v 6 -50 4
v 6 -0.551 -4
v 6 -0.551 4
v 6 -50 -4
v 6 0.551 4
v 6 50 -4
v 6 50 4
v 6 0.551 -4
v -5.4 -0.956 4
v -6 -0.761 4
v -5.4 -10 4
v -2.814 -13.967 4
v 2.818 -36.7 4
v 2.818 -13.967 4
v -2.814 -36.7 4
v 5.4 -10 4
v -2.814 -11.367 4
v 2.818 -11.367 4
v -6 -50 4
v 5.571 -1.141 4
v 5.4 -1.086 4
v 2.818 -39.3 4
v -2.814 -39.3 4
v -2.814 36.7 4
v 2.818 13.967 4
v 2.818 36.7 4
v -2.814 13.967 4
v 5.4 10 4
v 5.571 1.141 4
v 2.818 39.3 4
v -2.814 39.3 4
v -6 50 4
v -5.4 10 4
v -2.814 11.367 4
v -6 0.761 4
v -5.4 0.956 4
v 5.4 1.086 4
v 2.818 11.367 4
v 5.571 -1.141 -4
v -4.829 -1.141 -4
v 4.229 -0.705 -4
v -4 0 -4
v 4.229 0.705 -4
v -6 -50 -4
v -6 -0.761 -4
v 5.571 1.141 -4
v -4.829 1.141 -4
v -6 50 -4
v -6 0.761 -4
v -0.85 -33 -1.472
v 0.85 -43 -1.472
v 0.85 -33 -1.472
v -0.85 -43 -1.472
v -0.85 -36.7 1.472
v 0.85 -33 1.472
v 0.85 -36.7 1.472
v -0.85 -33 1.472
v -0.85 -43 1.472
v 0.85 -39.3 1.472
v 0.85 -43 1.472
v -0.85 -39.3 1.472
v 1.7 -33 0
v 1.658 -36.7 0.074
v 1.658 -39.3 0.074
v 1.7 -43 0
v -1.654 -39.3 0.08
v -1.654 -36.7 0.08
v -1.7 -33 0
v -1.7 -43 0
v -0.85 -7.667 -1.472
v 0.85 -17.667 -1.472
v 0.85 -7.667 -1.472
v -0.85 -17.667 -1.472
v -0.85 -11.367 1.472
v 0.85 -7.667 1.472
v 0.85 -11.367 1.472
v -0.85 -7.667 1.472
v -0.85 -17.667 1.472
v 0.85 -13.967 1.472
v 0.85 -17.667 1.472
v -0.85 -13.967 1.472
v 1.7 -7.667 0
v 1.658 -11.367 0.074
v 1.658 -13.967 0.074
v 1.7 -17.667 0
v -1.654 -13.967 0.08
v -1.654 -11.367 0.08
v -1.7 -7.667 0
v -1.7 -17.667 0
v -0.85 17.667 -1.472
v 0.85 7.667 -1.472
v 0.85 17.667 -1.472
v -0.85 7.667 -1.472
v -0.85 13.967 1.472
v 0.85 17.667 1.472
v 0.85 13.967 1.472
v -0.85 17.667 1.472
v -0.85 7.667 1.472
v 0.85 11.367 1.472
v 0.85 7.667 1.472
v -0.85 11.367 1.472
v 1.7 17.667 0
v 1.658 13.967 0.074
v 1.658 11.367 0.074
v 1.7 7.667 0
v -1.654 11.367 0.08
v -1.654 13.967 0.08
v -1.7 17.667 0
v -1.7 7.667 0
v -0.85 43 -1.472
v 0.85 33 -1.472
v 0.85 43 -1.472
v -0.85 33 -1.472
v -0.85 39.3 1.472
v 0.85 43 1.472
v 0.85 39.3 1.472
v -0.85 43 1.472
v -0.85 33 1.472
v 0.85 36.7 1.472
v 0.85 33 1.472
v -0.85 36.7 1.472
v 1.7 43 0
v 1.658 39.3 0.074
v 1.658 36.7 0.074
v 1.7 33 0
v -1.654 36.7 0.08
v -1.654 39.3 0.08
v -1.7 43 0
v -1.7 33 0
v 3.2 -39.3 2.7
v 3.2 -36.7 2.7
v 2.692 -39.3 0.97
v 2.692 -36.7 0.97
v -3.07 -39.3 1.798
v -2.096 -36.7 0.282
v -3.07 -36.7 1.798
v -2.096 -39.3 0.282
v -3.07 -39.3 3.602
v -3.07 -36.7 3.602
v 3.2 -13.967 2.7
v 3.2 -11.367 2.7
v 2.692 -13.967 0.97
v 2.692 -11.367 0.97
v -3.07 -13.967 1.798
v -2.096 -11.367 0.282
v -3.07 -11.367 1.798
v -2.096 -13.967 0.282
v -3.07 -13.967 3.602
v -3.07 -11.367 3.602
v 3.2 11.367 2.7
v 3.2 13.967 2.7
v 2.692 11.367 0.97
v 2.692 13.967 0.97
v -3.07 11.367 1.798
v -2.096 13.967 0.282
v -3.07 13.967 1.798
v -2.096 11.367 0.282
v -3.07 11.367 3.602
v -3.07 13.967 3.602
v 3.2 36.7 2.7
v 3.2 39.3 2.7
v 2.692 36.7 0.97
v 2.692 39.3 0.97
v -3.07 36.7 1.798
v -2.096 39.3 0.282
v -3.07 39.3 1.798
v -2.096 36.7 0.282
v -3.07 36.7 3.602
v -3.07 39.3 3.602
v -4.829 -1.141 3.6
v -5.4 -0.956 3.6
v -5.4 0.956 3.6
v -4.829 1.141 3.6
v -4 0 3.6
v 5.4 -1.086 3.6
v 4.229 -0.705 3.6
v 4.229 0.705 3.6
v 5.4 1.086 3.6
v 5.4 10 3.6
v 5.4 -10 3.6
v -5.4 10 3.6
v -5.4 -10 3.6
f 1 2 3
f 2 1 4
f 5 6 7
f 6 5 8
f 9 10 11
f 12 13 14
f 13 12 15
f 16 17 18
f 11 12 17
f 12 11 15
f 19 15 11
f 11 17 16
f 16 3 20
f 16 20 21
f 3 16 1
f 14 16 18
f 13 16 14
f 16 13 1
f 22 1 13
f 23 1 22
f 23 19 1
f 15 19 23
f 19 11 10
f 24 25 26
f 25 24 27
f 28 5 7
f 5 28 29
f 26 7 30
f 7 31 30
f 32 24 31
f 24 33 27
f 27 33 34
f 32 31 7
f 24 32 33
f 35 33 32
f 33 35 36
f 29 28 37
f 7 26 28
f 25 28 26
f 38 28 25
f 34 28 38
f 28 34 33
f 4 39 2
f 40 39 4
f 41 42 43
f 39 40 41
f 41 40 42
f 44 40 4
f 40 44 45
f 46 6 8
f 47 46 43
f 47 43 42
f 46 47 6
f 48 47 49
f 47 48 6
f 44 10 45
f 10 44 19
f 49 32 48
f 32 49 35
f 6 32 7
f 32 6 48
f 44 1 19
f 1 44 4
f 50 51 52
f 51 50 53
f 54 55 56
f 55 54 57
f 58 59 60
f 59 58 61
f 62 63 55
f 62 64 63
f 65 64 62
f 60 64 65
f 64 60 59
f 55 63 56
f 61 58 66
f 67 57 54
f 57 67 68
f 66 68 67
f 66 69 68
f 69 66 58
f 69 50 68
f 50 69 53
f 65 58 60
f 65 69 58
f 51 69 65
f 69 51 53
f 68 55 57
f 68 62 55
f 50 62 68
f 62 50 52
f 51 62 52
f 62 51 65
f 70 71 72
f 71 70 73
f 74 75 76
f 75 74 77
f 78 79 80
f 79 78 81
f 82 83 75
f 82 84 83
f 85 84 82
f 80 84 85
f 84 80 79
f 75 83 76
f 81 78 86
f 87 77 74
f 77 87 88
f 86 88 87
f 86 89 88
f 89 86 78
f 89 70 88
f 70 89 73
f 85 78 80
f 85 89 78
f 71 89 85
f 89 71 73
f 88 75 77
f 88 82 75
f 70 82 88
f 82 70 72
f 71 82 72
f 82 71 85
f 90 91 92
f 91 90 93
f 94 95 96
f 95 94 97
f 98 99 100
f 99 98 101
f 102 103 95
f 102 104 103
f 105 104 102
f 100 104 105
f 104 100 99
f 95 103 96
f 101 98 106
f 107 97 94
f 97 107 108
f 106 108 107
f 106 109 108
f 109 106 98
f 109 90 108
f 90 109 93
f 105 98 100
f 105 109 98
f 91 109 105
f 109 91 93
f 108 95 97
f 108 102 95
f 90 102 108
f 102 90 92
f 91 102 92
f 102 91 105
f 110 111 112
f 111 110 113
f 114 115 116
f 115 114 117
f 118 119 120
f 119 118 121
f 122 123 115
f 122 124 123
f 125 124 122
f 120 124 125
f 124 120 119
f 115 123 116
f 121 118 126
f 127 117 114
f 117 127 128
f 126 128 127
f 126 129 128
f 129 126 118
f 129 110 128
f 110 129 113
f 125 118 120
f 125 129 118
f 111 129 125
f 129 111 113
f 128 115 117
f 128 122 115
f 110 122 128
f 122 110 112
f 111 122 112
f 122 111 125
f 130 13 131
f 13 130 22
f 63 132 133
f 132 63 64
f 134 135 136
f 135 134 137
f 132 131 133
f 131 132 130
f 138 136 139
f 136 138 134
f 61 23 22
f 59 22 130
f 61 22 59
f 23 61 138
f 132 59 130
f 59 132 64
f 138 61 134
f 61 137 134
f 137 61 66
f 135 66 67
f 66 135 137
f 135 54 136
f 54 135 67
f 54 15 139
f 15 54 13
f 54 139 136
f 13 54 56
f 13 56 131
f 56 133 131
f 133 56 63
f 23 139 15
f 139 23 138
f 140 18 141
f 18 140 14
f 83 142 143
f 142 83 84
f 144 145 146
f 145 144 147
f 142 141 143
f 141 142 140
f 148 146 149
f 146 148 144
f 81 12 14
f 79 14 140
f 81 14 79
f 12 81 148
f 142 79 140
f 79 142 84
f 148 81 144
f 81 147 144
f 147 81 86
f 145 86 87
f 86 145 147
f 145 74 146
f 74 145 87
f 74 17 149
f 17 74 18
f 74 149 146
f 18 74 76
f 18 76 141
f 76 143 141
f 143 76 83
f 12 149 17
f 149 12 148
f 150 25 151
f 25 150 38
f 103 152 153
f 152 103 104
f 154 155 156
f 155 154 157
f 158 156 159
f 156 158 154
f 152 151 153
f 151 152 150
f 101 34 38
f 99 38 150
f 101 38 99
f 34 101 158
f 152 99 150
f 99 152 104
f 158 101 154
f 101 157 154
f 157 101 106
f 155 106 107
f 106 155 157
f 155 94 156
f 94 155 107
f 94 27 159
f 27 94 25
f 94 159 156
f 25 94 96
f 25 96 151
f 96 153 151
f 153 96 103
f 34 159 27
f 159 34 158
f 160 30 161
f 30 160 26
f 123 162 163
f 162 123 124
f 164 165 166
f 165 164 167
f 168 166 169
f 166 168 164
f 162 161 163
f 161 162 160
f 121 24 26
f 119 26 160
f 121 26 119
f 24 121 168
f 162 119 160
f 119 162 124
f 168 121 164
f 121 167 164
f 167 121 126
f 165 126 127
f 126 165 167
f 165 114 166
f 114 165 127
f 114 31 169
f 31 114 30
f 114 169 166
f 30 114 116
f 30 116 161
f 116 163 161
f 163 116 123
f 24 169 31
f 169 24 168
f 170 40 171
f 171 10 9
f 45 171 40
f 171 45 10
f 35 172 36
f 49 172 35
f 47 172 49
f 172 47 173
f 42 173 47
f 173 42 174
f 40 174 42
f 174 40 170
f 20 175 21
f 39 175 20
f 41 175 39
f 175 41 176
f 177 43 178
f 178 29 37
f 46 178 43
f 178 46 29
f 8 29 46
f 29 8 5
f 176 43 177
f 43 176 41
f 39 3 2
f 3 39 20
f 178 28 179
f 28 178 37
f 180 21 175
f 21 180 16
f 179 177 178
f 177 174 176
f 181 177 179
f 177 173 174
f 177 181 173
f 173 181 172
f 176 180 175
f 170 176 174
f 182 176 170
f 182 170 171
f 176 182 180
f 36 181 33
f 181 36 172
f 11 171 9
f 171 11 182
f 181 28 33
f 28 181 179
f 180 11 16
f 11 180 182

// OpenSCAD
// Parameters
rail_L = 100; //[50:200:1]
rail_W = 12; //[6:24:0.5]
rail_H = 8; //[4:16:0.5]
edge_chamfer = 0.8; //[0.4:1.6:0.1]
chamfer_inset = 0.6; //[0.3:1.2:0.1]
hole_count = 4; //[2:8:1]
end_margin = 12; //[6:24:1]
hole_r = 1.7; //[1.2:2.5:0.1]
csk_r = 3.2; //[2.4:4.5:0.1]
csk_depth = 1.6; //[0.8:3.0:0.1]
raceway_r = 1.2; //[0.6:2.0:0.1]
raceway_depth = 0.8; //[0.4:1.6:0.1]
raceway_z = 2.6; //[1.5:4.0:0.1]
op_overlap = 1; //[0.5:2:0.1]
end_face_thk = 0.8; //[0.4:1.6:0.1]

// Base Shapes
module rail_body_raw() {
  cube([rail_W, rail_L, rail_H], center=true);
}

module rail_body_inset() {
  cube([rail_W - 2*chamfer_inset, rail_L - 2*chamfer_inset, rail_H - 2*chamfer_inset], center=true);
}

module end_face_posY() {
  translate([0, rail_L/2 - end_face_thk/2, 0])
    cube([rail_W, end_face_thk, rail_H], center=true);
}

module end_face_negY() {
  translate([0, -rail_L/2 + end_face_thk/2, 0])
    cube([rail_W, end_face_thk, rail_H], center=true);
}

module mount_hole(posY) {
  translate([0, posY, 0])
    rotate([90, 0, 0])
      cylinder(h=rail_H + 2*op_overlap, r=hole_r, center=true);
}

module countersink(posY) {
  translate([0, posY, rail_H/2 - (csk_depth + op_overlap)/2])
    rotate([90, 0, 0])
      cylinder(h=csk_depth + op_overlap, r=csk_r, center=true);
}

module raceway_groove(xPos) {
  translate([xPos, 0, -rail_H/2 + raceway_z])
    cylinder(h=rail_L + 2*op_overlap, r=raceway_r, center=true);
}

module engraved_markings_placeholder() {
  translate([0, 0, rail_H/2 - (rail_H/20)/2])
    cube([rail_W - 2*chamfer_inset, rail_L/5, rail_H/20], center=true);
}

// Operations
module chamfers_fillets() {
  hull() {
    rail_body_raw();
    rail_body_inset();
  }
}

module end_faces() {
  union() {
    end_face_posY();
    end_face_negY();
  }
}

module rail_plus_end_faces() {
  union() {
    chamfers_fillets();
    end_faces();
  }
}

module mounting_holes() {
  union() {
    mount_hole(-rail_L/2 + end_margin);
    mount_hole(-rail_L/2 + end_margin + (rail_L - 2*end_margin)/3);
    mount_hole(-rail_L/2 + end_margin + 2*(rail_L - 2*end_margin)/3);
    mount_hole(rail_L/2 - end_margin);
  }
}

module countersinks() {
  union() {
    countersink(-rail_L/2 + end_margin);
    countersink(-rail_L/2 + end_margin + (rail_L - 2*end_margin)/3);
    countersink(-rail_L/2 + end_margin + 2*(rail_L - 2*end_margin)/3);
    countersink(rail_L/2 - end_margin);
  }
}

module raceway_grooves() {
  union() {
    raceway_groove(-rail_W/2 + raceway_depth);
    raceway_groove(rail_W/2 - raceway_depth);
  }
}

module holes_and_grooves() {
  union() {
    mounting_holes();
    countersinks();
    raceway_grooves();
  }
}

module rail_body() {
  difference() {
    rail_plus_end_faces();
    holes_and_grooves();
  }
}

module engraved_markings() {
  difference() {
    rail_body();
    engraved_markings_placeholder();
  }
}

// Final Output
color("Silver") engraved_markings();
